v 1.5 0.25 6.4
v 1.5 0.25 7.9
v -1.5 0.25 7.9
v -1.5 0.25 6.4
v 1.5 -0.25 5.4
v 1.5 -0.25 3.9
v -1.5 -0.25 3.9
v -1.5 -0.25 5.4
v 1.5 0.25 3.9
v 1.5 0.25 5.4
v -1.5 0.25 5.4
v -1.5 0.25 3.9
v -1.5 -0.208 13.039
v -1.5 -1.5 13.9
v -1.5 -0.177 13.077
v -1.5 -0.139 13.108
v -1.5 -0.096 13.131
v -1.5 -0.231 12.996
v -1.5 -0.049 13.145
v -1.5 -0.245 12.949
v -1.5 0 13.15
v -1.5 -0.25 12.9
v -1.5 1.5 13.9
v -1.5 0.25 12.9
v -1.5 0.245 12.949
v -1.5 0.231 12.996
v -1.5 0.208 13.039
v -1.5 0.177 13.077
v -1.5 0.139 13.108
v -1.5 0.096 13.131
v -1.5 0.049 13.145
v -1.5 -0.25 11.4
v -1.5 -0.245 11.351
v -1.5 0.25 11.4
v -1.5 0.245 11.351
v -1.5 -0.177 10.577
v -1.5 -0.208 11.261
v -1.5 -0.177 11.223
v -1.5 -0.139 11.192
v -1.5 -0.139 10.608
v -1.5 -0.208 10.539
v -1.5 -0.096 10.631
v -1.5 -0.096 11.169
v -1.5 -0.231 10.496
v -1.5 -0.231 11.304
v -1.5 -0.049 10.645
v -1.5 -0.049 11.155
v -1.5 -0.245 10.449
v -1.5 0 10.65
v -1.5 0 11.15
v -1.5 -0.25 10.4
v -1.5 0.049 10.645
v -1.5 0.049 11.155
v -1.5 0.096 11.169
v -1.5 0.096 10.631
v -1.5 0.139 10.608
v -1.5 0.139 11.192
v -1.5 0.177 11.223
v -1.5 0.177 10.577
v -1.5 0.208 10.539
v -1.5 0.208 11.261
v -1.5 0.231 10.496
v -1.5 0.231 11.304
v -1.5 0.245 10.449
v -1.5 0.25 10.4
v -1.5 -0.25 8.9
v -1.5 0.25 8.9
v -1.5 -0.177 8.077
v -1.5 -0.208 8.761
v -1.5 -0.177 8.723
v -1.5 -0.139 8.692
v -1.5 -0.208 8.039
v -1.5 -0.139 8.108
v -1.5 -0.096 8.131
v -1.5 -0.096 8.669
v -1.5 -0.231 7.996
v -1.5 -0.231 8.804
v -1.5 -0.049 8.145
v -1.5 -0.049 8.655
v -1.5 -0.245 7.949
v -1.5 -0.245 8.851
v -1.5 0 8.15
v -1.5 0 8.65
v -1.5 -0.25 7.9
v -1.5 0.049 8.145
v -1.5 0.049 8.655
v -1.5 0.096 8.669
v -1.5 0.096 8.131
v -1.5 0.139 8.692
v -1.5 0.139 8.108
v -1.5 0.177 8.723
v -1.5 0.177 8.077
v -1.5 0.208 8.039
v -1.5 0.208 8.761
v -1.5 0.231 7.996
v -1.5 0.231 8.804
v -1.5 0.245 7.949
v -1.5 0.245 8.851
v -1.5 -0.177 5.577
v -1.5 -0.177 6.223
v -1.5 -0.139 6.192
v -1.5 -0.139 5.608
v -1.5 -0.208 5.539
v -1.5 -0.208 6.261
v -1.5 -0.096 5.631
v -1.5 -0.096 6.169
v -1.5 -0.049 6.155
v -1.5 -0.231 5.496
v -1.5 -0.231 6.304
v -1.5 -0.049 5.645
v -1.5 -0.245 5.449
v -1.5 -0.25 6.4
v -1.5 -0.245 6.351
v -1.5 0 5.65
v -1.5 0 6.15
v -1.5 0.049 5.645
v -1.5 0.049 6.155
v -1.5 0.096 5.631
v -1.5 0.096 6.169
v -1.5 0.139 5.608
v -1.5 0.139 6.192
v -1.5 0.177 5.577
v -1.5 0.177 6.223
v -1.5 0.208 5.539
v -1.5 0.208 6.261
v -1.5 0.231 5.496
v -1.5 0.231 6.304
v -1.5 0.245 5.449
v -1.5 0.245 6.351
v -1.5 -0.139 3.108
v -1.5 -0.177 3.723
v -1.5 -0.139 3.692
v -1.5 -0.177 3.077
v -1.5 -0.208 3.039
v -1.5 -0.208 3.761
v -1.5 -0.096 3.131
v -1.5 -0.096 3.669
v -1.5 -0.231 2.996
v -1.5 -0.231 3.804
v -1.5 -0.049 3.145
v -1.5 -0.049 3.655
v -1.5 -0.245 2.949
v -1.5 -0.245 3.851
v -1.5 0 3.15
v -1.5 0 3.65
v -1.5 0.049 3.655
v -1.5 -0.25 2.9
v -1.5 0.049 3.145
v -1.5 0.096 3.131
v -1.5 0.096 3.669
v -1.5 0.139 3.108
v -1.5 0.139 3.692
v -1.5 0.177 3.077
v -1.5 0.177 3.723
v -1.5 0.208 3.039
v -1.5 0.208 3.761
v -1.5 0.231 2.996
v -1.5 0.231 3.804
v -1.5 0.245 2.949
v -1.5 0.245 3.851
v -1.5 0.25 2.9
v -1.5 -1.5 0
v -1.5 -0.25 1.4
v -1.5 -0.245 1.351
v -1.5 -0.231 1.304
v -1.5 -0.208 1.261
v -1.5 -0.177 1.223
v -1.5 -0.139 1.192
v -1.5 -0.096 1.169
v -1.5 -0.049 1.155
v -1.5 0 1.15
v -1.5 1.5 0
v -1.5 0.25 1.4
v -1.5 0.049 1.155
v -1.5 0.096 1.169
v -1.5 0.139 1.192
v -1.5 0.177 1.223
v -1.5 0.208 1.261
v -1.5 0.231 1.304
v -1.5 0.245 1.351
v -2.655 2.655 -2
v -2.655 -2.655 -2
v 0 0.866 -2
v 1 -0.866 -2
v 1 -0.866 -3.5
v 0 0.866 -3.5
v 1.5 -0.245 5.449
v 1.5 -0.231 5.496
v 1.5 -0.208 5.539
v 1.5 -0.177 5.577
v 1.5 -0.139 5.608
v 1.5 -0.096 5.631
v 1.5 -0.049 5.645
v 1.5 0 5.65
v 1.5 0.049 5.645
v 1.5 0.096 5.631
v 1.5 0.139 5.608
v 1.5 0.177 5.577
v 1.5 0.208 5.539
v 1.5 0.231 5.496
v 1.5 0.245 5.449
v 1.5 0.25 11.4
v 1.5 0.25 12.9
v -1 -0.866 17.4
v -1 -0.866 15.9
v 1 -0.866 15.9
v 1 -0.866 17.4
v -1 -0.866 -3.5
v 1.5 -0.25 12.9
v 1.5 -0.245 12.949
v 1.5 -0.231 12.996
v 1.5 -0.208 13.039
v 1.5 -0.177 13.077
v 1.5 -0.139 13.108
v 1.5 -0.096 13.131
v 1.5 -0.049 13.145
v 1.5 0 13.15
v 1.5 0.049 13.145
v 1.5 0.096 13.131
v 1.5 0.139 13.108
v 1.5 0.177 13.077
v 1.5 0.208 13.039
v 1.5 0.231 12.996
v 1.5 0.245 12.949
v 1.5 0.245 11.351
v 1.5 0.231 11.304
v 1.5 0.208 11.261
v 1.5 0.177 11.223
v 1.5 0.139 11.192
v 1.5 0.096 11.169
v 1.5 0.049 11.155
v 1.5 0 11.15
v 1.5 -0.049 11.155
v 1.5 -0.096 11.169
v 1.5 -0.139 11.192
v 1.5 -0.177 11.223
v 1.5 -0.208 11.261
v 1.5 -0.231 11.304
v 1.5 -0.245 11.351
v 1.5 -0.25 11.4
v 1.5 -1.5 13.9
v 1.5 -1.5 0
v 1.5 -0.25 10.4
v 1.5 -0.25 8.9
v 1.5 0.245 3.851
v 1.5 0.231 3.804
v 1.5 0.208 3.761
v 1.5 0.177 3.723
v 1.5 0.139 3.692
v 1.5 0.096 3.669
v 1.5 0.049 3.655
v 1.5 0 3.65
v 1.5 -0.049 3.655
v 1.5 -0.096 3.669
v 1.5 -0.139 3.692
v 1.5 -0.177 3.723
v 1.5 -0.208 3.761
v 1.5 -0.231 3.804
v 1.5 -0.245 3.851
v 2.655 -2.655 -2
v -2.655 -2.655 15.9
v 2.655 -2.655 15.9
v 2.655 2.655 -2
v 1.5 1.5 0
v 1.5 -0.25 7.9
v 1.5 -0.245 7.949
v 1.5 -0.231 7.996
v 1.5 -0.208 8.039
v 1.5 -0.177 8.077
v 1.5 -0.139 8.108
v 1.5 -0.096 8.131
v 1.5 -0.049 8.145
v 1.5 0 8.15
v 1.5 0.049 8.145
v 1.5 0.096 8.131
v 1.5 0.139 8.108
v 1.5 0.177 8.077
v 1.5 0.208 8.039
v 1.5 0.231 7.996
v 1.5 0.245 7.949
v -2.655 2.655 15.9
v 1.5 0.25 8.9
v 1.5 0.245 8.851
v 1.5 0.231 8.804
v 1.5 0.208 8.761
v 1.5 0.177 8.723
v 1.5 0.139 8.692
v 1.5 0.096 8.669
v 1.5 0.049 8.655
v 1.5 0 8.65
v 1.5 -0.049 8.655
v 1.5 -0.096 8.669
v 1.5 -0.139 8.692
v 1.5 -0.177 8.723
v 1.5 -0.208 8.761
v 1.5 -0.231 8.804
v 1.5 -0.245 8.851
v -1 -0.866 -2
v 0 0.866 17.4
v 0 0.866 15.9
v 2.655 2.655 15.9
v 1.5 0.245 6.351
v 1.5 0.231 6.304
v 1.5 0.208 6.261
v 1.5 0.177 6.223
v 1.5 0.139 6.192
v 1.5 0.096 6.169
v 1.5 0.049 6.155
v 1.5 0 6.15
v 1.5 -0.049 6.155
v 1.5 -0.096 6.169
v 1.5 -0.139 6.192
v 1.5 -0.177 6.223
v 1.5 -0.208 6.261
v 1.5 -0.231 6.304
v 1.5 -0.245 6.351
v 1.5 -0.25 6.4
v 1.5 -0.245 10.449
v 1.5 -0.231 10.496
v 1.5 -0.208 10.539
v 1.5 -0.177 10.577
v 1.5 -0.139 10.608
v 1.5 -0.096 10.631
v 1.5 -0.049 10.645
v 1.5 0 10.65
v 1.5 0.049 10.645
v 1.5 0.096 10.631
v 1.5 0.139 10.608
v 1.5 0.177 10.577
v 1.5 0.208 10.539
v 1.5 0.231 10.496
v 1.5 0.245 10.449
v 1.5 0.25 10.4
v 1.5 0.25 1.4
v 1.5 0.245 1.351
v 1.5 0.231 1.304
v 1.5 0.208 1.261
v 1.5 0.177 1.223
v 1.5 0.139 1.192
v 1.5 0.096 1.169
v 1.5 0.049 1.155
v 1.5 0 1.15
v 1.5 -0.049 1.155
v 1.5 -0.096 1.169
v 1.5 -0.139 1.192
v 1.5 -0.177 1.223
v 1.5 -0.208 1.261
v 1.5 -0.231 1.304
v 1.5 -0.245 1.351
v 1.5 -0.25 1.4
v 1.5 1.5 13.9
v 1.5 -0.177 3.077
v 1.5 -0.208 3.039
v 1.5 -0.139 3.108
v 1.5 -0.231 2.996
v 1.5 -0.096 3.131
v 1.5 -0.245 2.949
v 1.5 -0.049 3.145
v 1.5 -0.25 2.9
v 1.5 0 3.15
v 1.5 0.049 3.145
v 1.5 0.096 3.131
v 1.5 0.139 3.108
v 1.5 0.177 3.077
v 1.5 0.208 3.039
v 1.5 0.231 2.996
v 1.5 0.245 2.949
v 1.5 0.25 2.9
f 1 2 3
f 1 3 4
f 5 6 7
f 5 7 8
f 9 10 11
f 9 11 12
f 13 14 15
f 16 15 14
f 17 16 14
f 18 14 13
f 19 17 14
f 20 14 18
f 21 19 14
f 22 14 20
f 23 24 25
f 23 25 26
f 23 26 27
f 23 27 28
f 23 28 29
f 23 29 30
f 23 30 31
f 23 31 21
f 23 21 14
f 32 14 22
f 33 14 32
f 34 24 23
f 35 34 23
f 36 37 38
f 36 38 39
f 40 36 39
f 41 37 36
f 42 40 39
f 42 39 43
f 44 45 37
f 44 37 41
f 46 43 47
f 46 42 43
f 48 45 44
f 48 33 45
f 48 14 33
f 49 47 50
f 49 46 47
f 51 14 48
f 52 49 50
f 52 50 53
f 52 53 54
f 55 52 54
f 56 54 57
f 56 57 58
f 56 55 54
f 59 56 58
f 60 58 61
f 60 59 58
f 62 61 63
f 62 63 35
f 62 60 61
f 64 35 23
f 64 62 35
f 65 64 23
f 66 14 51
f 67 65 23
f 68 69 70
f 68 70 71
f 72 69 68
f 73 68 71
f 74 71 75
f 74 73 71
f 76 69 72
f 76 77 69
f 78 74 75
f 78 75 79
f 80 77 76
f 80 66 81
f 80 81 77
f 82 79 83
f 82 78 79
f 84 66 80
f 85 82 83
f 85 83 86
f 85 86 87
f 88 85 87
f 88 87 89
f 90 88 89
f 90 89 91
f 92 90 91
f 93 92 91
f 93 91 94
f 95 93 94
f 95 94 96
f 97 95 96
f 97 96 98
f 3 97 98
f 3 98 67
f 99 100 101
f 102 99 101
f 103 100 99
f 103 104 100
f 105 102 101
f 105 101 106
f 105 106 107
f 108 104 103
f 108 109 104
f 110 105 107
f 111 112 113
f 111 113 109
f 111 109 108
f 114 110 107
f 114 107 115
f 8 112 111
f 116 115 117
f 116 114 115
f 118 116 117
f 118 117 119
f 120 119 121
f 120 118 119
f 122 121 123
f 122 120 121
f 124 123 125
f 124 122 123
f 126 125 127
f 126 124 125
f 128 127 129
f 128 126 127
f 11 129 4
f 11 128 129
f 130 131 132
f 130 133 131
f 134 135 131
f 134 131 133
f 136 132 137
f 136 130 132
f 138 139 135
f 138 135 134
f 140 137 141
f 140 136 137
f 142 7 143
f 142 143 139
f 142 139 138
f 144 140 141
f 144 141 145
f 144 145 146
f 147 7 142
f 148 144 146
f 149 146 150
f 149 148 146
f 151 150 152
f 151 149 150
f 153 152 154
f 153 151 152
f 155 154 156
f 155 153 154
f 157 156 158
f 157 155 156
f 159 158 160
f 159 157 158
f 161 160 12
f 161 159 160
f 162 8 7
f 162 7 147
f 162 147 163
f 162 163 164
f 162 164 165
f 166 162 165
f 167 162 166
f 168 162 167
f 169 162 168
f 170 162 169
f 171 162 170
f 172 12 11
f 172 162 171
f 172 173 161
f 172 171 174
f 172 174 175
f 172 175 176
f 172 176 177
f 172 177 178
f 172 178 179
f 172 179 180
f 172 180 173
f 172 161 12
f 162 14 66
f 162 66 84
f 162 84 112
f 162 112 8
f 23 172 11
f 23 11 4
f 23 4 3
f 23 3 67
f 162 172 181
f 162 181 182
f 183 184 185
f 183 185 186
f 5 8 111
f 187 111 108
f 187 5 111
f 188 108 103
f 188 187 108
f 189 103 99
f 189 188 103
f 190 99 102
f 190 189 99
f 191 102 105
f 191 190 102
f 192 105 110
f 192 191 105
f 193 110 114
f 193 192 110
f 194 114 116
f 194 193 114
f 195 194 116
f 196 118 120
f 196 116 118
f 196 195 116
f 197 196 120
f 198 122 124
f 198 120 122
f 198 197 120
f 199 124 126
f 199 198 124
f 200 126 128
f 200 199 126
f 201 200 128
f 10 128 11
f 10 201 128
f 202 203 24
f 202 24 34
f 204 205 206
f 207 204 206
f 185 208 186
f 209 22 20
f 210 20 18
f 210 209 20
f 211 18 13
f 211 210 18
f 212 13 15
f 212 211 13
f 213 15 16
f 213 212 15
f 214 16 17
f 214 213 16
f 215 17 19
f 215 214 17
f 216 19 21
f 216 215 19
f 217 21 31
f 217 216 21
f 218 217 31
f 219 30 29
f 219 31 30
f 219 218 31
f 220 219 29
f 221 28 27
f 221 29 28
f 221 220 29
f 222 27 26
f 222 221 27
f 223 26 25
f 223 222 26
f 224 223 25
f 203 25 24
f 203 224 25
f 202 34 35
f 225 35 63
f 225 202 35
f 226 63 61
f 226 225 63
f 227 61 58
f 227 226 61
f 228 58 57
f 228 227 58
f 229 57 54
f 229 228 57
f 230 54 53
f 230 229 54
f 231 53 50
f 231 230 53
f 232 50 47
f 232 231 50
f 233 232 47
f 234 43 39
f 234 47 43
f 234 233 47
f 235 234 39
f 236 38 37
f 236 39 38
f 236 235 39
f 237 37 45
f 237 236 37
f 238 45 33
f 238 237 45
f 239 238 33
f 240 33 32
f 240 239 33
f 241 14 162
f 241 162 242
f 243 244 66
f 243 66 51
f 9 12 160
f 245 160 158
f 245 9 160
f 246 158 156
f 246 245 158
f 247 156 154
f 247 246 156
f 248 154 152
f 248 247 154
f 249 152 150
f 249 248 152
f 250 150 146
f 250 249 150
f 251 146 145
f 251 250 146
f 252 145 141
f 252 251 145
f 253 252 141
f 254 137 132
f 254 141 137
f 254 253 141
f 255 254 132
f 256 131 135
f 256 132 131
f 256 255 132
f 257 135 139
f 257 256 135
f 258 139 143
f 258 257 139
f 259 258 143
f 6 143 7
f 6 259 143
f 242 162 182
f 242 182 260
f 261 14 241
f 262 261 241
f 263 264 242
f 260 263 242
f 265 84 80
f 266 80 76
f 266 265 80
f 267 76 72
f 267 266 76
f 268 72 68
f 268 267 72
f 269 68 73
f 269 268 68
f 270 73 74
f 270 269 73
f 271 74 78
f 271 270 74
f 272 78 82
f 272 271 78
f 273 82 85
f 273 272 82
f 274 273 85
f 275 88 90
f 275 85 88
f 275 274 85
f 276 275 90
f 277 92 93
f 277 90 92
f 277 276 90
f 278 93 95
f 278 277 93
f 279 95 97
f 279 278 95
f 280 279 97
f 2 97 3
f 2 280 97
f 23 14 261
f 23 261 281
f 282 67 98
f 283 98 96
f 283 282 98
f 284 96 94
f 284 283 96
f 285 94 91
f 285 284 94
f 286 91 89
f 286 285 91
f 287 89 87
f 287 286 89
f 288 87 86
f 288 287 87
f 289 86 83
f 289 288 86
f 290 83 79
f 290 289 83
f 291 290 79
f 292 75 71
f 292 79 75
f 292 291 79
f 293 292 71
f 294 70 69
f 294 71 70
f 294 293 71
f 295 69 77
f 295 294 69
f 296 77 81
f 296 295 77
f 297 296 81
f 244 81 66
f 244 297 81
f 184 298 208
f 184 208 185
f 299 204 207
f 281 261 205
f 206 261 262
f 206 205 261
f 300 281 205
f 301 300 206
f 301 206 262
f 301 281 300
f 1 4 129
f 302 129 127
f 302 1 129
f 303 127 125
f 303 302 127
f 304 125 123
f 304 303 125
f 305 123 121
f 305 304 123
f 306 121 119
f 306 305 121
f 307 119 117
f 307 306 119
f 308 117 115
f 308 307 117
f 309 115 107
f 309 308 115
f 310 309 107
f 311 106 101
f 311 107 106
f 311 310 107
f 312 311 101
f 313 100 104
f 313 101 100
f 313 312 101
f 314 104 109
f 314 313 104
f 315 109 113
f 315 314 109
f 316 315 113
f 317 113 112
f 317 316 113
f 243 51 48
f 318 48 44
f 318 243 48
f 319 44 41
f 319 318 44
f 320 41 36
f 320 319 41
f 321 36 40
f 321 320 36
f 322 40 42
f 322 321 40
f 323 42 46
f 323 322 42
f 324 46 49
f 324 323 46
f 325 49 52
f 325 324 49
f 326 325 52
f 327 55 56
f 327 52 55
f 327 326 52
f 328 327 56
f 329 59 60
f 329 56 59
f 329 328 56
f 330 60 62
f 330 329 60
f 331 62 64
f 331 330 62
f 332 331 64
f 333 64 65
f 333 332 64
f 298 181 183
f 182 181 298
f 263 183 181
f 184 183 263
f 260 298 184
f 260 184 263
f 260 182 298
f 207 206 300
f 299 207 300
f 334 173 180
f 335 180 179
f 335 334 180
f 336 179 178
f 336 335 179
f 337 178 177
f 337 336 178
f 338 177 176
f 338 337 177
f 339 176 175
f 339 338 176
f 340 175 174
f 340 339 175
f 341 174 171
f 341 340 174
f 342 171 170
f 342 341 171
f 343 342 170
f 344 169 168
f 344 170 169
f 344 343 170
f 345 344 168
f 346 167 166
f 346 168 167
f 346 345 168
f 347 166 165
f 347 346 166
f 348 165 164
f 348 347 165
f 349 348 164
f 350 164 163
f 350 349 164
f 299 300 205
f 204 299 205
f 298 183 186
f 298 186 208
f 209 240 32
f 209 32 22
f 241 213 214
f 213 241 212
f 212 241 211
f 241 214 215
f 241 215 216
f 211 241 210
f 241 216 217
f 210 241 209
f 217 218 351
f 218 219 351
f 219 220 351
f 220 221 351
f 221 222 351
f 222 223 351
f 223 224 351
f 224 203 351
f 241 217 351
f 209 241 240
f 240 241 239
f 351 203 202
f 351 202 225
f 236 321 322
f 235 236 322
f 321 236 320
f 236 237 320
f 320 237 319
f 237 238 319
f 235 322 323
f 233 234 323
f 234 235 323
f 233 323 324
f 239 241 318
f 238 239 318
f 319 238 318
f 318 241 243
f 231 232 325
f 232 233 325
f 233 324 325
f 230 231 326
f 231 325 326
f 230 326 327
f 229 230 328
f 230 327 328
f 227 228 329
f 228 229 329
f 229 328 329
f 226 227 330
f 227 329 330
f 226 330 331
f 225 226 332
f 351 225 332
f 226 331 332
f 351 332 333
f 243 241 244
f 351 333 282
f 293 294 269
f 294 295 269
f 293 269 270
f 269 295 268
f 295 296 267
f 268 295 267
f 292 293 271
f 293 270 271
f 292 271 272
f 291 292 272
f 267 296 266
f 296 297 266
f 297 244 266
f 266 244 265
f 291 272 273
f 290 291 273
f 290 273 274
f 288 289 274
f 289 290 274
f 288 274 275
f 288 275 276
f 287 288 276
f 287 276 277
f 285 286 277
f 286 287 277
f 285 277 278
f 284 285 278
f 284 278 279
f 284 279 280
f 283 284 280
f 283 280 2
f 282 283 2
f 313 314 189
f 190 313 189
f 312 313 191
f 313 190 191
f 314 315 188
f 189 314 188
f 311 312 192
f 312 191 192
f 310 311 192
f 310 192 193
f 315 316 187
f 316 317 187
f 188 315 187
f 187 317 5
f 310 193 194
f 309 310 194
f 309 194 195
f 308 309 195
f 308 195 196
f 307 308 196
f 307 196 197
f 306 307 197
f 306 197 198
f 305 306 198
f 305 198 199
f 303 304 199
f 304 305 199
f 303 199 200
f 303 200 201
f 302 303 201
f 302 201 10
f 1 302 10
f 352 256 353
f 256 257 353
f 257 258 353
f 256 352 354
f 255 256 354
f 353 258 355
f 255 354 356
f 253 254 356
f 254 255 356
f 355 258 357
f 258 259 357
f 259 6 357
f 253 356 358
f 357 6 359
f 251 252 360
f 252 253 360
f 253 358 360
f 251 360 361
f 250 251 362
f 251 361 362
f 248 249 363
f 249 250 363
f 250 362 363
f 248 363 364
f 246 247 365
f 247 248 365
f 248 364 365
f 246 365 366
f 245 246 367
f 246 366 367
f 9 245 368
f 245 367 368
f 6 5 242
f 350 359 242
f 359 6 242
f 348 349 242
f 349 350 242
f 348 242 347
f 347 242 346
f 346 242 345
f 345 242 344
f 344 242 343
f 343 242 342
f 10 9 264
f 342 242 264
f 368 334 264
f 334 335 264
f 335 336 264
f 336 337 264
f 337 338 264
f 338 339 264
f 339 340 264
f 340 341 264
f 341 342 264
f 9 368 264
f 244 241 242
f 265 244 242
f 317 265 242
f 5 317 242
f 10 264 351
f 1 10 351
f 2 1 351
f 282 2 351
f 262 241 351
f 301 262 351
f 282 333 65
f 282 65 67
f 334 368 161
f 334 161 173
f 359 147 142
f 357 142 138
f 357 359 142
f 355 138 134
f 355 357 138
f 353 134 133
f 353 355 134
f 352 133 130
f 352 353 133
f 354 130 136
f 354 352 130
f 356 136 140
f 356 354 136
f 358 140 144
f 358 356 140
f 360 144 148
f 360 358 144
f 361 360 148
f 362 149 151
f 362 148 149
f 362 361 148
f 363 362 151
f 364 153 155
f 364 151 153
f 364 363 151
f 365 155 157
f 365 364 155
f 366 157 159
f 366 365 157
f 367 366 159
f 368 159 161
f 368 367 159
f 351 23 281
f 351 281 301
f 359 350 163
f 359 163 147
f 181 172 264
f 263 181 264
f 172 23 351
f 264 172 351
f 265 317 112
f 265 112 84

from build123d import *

# Parameters (mm, degrees)
SKETCH1_W               = 3
SKETCH1_H               = 3
BOSS_EXTRUDE1_DEPTH     = 13.9
SKETCH2_W               = 3
SKETCH2_H               = 3
BOSS_EXTRUDE2_DEPTH     = 2
BOSS_EXTRUDE2_DRAFT     = -30
MIRROR1_COPY_1_SKETCH_W = 3
MIRROR1_COPY_1_SKETCH_H = 3
MIRROR1_COPY_1_DEPTH    = 2
MIRROR1_COPY_1_DRAFT    = -30
BOSS_EXTRUDE3_DEPTH     = 1.5
CUT_EXTRUDE1_REACH      = 20.085


with BuildPart() as part:
    # Sketch1 → Boss-Extrude1 (new body)
    with BuildSketch(Plane.XY):
        Rectangle(SKETCH1_W, SKETCH1_H)
    extrude(amount=BOSS_EXTRUDE1_DEPTH)


with BuildPart() as boss_extrude2_tool:
    # Sketch2 → Boss-Extrude2 (with draft: the straight prism first)
    with BuildSketch(Plane.XY.offset(13.9)):
        Rectangle(SKETCH2_W, SKETCH2_H)
    extrude(amount=BOSS_EXTRUDE2_DEPTH)
    # Boss-Extrude2: the draft: its side faces are tilted about the plane it starts from
    boss_extrude2_sides = [boss_extrude2_tool.faces().sort_by_distance(p)[0] for p in [
        (1.5, 0, 14.9),
        (0, 1.5, 14.9),
        (-1.5, 0, 14.9),
        (0, -1.5, 14.9),
    ]]
    draft(boss_extrude2_sides, Plane.XY.offset(13.9), BOSS_EXTRUDE2_DRAFT)


with BuildPart() as part_1:
    add(part.part)

    # Boss-Extrude2: add boss_extrude2_tool
    add(boss_extrude2_tool.part)


with BuildPart() as mirror1_copy_1_tool:
    # Mirror1 copy 1 sketch → Mirror1 copy 1 (with draft: the straight prism first)
    with BuildSketch(Plane(origin=(0, 0, 0), x_dir=(1, 0, 0), z_dir=(0, 0, -1))):
        Rectangle(MIRROR1_COPY_1_SKETCH_W, MIRROR1_COPY_1_SKETCH_H)
    extrude(amount=MIRROR1_COPY_1_DEPTH)
    # Mirror1 copy 1: the draft: its side faces are tilted about the plane it starts from
    mirror1_copy_1_sides = [mirror1_copy_1_tool.faces().sort_by_distance(p)[0] for p in [
        (1.5, 0, -1),
        (0, 1.5, -1),
        (-1.5, 0, -1),
        (0, -1.5, -1),
    ]]
    draft(mirror1_copy_1_sides, Plane(origin=(0, 0, 0), x_dir=(1, 0, 0), z_dir=(0, 0, -1)), MIRROR1_COPY_1_DRAFT)


with BuildPart() as part_2:
    add(part_1.part)

    # Mirror1 copy 1: add mirror1_copy_1_tool
    add(mirror1_copy_1_tool.part)

    # Sketch3 → Boss-Extrude3 (add)
    with BuildSketch(Plane.XY.offset(15.9)):
        Polygon((0, 0.866025404), (-1, -0.866025404), (1, -0.866025404), align=None)
    boss_extrude3 = extrude(amount=BOSS_EXTRUDE3_DEPTH)

    # Mirror2: Boss-Extrude3 across plane
    add(boss_extrude3.mirror(Plane.XY.offset(6.95)))

    # Sketch7 → Cut-Extrude1 (cut, up to next)
    with BuildSketch(Plane(origin=(1.5, 0, 0), x_dir=(0, 0, -1), z_dir=(1, 0, 0)), mode=Mode.PRIVATE) as cut_extrude1_sk1:
        with BuildLine():
            Line((-12.9, 0.25), (-11.4, 0.25))
            ThreePointArc((-11.4, 0.25), (-11.15, 0), (-11.4, -0.25))
            Line((-11.4, -0.25), (-12.9, -0.25))
            ThreePointArc((-12.9, -0.25), (-13.15, 0), (-12.9, 0.25))
        make_face()
    cut_extrude1_tool1 = extrude(cut_extrude1_sk1.sketch, amount=-CUT_EXTRUDE1_REACH, mode=Mode.PRIVATE) & part_2.part
    # Sketch7 → Cut-Extrude1 (cut, up to next)
    with BuildSketch(Plane(origin=(1.5, 0, 0), x_dir=(0, 0, -1), z_dir=(1, 0, 0)), mode=Mode.PRIVATE) as cut_extrude1_sk2:
        with BuildLine():
            Line((-10.4, 0.25), (-8.9, 0.25))
            ThreePointArc((-8.9, 0.25), (-8.65, 0), (-8.9, -0.25))
            Line((-8.9, -0.25), (-10.4, -0.25))
            ThreePointArc((-10.4, -0.25), (-10.65, 0), (-10.4, 0.25))
        make_face()
    cut_extrude1_tool2 = extrude(cut_extrude1_sk2.sketch, amount=-CUT_EXTRUDE1_REACH, mode=Mode.PRIVATE) & part_2.part
    # Sketch7 → Cut-Extrude1 (cut, up to next)
    with BuildSketch(Plane(origin=(1.5, 0, 0), x_dir=(0, 0, -1), z_dir=(1, 0, 0)), mode=Mode.PRIVATE) as cut_extrude1_sk3:
        with BuildLine():
            Line((-7.9, 0.25), (-6.4, 0.25))
            ThreePointArc((-6.4, 0.25), (-6.15, 0), (-6.4, -0.25))
            Line((-6.4, -0.25), (-7.9, -0.25))
            ThreePointArc((-7.9, -0.25), (-8.15, 0), (-7.9, 0.25))
        make_face()
    cut_extrude1_tool3 = extrude(cut_extrude1_sk3.sketch, amount=-CUT_EXTRUDE1_REACH, mode=Mode.PRIVATE) & part_2.part
    # Sketch7 → Cut-Extrude1 (cut, up to next)
    with BuildSketch(Plane(origin=(1.5, 0, 0), x_dir=(0, 0, -1), z_dir=(1, 0, 0)), mode=Mode.PRIVATE) as cut_extrude1_sk4:
        with BuildLine():
            Line((-5.4, 0.25), (-3.9, 0.25))
            ThreePointArc((-3.9, 0.25), (-3.65, 0), (-3.9, -0.25))
            Line((-3.9, -0.25), (-5.4, -0.25))
            ThreePointArc((-5.4, -0.25), (-5.65, 0), (-5.4, 0.25))
        make_face()
    cut_extrude1_tool4 = extrude(cut_extrude1_sk4.sketch, amount=-CUT_EXTRUDE1_REACH, mode=Mode.PRIVATE) & part_2.part
    # Sketch7 → Cut-Extrude1 (cut, up to next)
    with BuildSketch(Plane(origin=(1.5, 0, 0), x_dir=(0, 0, -1), z_dir=(1, 0, 0)), mode=Mode.PRIVATE) as cut_extrude1_sk5:
        with BuildLine():
            Line((-2.9, 0.25), (-1.4, 0.25))
            ThreePointArc((-1.4, 0.25), (-1.15, 0), (-1.4, -0.25))
            Line((-1.4, -0.25), (-2.9, -0.25))
            ThreePointArc((-2.9, -0.25), (-3.15, 0), (-2.9, 0.25))
        make_face()
    cut_extrude1_tool5 = extrude(cut_extrude1_sk5.sketch, amount=-CUT_EXTRUDE1_REACH, mode=Mode.PRIVATE) & part_2.part
    add(cut_extrude1_tool1.solids().sort_by_distance((1.5, 0, 12.15))[0], mode=Mode.SUBTRACT)
    add(cut_extrude1_tool2.solids().sort_by_distance((1.5, 0, 9.65))[0], mode=Mode.SUBTRACT)
    add(cut_extrude1_tool3.solids().sort_by_distance((1.5, 0, 7.15))[0], mode=Mode.SUBTRACT)
    add(cut_extrude1_tool4.solids().sort_by_distance((1.5, 0, 4.65))[0], mode=Mode.SUBTRACT)
    add(cut_extrude1_tool5.solids().sort_by_distance((1.5, 0, 2.15))[0], mode=Mode.SUBTRACT)


solid = part_2.part
